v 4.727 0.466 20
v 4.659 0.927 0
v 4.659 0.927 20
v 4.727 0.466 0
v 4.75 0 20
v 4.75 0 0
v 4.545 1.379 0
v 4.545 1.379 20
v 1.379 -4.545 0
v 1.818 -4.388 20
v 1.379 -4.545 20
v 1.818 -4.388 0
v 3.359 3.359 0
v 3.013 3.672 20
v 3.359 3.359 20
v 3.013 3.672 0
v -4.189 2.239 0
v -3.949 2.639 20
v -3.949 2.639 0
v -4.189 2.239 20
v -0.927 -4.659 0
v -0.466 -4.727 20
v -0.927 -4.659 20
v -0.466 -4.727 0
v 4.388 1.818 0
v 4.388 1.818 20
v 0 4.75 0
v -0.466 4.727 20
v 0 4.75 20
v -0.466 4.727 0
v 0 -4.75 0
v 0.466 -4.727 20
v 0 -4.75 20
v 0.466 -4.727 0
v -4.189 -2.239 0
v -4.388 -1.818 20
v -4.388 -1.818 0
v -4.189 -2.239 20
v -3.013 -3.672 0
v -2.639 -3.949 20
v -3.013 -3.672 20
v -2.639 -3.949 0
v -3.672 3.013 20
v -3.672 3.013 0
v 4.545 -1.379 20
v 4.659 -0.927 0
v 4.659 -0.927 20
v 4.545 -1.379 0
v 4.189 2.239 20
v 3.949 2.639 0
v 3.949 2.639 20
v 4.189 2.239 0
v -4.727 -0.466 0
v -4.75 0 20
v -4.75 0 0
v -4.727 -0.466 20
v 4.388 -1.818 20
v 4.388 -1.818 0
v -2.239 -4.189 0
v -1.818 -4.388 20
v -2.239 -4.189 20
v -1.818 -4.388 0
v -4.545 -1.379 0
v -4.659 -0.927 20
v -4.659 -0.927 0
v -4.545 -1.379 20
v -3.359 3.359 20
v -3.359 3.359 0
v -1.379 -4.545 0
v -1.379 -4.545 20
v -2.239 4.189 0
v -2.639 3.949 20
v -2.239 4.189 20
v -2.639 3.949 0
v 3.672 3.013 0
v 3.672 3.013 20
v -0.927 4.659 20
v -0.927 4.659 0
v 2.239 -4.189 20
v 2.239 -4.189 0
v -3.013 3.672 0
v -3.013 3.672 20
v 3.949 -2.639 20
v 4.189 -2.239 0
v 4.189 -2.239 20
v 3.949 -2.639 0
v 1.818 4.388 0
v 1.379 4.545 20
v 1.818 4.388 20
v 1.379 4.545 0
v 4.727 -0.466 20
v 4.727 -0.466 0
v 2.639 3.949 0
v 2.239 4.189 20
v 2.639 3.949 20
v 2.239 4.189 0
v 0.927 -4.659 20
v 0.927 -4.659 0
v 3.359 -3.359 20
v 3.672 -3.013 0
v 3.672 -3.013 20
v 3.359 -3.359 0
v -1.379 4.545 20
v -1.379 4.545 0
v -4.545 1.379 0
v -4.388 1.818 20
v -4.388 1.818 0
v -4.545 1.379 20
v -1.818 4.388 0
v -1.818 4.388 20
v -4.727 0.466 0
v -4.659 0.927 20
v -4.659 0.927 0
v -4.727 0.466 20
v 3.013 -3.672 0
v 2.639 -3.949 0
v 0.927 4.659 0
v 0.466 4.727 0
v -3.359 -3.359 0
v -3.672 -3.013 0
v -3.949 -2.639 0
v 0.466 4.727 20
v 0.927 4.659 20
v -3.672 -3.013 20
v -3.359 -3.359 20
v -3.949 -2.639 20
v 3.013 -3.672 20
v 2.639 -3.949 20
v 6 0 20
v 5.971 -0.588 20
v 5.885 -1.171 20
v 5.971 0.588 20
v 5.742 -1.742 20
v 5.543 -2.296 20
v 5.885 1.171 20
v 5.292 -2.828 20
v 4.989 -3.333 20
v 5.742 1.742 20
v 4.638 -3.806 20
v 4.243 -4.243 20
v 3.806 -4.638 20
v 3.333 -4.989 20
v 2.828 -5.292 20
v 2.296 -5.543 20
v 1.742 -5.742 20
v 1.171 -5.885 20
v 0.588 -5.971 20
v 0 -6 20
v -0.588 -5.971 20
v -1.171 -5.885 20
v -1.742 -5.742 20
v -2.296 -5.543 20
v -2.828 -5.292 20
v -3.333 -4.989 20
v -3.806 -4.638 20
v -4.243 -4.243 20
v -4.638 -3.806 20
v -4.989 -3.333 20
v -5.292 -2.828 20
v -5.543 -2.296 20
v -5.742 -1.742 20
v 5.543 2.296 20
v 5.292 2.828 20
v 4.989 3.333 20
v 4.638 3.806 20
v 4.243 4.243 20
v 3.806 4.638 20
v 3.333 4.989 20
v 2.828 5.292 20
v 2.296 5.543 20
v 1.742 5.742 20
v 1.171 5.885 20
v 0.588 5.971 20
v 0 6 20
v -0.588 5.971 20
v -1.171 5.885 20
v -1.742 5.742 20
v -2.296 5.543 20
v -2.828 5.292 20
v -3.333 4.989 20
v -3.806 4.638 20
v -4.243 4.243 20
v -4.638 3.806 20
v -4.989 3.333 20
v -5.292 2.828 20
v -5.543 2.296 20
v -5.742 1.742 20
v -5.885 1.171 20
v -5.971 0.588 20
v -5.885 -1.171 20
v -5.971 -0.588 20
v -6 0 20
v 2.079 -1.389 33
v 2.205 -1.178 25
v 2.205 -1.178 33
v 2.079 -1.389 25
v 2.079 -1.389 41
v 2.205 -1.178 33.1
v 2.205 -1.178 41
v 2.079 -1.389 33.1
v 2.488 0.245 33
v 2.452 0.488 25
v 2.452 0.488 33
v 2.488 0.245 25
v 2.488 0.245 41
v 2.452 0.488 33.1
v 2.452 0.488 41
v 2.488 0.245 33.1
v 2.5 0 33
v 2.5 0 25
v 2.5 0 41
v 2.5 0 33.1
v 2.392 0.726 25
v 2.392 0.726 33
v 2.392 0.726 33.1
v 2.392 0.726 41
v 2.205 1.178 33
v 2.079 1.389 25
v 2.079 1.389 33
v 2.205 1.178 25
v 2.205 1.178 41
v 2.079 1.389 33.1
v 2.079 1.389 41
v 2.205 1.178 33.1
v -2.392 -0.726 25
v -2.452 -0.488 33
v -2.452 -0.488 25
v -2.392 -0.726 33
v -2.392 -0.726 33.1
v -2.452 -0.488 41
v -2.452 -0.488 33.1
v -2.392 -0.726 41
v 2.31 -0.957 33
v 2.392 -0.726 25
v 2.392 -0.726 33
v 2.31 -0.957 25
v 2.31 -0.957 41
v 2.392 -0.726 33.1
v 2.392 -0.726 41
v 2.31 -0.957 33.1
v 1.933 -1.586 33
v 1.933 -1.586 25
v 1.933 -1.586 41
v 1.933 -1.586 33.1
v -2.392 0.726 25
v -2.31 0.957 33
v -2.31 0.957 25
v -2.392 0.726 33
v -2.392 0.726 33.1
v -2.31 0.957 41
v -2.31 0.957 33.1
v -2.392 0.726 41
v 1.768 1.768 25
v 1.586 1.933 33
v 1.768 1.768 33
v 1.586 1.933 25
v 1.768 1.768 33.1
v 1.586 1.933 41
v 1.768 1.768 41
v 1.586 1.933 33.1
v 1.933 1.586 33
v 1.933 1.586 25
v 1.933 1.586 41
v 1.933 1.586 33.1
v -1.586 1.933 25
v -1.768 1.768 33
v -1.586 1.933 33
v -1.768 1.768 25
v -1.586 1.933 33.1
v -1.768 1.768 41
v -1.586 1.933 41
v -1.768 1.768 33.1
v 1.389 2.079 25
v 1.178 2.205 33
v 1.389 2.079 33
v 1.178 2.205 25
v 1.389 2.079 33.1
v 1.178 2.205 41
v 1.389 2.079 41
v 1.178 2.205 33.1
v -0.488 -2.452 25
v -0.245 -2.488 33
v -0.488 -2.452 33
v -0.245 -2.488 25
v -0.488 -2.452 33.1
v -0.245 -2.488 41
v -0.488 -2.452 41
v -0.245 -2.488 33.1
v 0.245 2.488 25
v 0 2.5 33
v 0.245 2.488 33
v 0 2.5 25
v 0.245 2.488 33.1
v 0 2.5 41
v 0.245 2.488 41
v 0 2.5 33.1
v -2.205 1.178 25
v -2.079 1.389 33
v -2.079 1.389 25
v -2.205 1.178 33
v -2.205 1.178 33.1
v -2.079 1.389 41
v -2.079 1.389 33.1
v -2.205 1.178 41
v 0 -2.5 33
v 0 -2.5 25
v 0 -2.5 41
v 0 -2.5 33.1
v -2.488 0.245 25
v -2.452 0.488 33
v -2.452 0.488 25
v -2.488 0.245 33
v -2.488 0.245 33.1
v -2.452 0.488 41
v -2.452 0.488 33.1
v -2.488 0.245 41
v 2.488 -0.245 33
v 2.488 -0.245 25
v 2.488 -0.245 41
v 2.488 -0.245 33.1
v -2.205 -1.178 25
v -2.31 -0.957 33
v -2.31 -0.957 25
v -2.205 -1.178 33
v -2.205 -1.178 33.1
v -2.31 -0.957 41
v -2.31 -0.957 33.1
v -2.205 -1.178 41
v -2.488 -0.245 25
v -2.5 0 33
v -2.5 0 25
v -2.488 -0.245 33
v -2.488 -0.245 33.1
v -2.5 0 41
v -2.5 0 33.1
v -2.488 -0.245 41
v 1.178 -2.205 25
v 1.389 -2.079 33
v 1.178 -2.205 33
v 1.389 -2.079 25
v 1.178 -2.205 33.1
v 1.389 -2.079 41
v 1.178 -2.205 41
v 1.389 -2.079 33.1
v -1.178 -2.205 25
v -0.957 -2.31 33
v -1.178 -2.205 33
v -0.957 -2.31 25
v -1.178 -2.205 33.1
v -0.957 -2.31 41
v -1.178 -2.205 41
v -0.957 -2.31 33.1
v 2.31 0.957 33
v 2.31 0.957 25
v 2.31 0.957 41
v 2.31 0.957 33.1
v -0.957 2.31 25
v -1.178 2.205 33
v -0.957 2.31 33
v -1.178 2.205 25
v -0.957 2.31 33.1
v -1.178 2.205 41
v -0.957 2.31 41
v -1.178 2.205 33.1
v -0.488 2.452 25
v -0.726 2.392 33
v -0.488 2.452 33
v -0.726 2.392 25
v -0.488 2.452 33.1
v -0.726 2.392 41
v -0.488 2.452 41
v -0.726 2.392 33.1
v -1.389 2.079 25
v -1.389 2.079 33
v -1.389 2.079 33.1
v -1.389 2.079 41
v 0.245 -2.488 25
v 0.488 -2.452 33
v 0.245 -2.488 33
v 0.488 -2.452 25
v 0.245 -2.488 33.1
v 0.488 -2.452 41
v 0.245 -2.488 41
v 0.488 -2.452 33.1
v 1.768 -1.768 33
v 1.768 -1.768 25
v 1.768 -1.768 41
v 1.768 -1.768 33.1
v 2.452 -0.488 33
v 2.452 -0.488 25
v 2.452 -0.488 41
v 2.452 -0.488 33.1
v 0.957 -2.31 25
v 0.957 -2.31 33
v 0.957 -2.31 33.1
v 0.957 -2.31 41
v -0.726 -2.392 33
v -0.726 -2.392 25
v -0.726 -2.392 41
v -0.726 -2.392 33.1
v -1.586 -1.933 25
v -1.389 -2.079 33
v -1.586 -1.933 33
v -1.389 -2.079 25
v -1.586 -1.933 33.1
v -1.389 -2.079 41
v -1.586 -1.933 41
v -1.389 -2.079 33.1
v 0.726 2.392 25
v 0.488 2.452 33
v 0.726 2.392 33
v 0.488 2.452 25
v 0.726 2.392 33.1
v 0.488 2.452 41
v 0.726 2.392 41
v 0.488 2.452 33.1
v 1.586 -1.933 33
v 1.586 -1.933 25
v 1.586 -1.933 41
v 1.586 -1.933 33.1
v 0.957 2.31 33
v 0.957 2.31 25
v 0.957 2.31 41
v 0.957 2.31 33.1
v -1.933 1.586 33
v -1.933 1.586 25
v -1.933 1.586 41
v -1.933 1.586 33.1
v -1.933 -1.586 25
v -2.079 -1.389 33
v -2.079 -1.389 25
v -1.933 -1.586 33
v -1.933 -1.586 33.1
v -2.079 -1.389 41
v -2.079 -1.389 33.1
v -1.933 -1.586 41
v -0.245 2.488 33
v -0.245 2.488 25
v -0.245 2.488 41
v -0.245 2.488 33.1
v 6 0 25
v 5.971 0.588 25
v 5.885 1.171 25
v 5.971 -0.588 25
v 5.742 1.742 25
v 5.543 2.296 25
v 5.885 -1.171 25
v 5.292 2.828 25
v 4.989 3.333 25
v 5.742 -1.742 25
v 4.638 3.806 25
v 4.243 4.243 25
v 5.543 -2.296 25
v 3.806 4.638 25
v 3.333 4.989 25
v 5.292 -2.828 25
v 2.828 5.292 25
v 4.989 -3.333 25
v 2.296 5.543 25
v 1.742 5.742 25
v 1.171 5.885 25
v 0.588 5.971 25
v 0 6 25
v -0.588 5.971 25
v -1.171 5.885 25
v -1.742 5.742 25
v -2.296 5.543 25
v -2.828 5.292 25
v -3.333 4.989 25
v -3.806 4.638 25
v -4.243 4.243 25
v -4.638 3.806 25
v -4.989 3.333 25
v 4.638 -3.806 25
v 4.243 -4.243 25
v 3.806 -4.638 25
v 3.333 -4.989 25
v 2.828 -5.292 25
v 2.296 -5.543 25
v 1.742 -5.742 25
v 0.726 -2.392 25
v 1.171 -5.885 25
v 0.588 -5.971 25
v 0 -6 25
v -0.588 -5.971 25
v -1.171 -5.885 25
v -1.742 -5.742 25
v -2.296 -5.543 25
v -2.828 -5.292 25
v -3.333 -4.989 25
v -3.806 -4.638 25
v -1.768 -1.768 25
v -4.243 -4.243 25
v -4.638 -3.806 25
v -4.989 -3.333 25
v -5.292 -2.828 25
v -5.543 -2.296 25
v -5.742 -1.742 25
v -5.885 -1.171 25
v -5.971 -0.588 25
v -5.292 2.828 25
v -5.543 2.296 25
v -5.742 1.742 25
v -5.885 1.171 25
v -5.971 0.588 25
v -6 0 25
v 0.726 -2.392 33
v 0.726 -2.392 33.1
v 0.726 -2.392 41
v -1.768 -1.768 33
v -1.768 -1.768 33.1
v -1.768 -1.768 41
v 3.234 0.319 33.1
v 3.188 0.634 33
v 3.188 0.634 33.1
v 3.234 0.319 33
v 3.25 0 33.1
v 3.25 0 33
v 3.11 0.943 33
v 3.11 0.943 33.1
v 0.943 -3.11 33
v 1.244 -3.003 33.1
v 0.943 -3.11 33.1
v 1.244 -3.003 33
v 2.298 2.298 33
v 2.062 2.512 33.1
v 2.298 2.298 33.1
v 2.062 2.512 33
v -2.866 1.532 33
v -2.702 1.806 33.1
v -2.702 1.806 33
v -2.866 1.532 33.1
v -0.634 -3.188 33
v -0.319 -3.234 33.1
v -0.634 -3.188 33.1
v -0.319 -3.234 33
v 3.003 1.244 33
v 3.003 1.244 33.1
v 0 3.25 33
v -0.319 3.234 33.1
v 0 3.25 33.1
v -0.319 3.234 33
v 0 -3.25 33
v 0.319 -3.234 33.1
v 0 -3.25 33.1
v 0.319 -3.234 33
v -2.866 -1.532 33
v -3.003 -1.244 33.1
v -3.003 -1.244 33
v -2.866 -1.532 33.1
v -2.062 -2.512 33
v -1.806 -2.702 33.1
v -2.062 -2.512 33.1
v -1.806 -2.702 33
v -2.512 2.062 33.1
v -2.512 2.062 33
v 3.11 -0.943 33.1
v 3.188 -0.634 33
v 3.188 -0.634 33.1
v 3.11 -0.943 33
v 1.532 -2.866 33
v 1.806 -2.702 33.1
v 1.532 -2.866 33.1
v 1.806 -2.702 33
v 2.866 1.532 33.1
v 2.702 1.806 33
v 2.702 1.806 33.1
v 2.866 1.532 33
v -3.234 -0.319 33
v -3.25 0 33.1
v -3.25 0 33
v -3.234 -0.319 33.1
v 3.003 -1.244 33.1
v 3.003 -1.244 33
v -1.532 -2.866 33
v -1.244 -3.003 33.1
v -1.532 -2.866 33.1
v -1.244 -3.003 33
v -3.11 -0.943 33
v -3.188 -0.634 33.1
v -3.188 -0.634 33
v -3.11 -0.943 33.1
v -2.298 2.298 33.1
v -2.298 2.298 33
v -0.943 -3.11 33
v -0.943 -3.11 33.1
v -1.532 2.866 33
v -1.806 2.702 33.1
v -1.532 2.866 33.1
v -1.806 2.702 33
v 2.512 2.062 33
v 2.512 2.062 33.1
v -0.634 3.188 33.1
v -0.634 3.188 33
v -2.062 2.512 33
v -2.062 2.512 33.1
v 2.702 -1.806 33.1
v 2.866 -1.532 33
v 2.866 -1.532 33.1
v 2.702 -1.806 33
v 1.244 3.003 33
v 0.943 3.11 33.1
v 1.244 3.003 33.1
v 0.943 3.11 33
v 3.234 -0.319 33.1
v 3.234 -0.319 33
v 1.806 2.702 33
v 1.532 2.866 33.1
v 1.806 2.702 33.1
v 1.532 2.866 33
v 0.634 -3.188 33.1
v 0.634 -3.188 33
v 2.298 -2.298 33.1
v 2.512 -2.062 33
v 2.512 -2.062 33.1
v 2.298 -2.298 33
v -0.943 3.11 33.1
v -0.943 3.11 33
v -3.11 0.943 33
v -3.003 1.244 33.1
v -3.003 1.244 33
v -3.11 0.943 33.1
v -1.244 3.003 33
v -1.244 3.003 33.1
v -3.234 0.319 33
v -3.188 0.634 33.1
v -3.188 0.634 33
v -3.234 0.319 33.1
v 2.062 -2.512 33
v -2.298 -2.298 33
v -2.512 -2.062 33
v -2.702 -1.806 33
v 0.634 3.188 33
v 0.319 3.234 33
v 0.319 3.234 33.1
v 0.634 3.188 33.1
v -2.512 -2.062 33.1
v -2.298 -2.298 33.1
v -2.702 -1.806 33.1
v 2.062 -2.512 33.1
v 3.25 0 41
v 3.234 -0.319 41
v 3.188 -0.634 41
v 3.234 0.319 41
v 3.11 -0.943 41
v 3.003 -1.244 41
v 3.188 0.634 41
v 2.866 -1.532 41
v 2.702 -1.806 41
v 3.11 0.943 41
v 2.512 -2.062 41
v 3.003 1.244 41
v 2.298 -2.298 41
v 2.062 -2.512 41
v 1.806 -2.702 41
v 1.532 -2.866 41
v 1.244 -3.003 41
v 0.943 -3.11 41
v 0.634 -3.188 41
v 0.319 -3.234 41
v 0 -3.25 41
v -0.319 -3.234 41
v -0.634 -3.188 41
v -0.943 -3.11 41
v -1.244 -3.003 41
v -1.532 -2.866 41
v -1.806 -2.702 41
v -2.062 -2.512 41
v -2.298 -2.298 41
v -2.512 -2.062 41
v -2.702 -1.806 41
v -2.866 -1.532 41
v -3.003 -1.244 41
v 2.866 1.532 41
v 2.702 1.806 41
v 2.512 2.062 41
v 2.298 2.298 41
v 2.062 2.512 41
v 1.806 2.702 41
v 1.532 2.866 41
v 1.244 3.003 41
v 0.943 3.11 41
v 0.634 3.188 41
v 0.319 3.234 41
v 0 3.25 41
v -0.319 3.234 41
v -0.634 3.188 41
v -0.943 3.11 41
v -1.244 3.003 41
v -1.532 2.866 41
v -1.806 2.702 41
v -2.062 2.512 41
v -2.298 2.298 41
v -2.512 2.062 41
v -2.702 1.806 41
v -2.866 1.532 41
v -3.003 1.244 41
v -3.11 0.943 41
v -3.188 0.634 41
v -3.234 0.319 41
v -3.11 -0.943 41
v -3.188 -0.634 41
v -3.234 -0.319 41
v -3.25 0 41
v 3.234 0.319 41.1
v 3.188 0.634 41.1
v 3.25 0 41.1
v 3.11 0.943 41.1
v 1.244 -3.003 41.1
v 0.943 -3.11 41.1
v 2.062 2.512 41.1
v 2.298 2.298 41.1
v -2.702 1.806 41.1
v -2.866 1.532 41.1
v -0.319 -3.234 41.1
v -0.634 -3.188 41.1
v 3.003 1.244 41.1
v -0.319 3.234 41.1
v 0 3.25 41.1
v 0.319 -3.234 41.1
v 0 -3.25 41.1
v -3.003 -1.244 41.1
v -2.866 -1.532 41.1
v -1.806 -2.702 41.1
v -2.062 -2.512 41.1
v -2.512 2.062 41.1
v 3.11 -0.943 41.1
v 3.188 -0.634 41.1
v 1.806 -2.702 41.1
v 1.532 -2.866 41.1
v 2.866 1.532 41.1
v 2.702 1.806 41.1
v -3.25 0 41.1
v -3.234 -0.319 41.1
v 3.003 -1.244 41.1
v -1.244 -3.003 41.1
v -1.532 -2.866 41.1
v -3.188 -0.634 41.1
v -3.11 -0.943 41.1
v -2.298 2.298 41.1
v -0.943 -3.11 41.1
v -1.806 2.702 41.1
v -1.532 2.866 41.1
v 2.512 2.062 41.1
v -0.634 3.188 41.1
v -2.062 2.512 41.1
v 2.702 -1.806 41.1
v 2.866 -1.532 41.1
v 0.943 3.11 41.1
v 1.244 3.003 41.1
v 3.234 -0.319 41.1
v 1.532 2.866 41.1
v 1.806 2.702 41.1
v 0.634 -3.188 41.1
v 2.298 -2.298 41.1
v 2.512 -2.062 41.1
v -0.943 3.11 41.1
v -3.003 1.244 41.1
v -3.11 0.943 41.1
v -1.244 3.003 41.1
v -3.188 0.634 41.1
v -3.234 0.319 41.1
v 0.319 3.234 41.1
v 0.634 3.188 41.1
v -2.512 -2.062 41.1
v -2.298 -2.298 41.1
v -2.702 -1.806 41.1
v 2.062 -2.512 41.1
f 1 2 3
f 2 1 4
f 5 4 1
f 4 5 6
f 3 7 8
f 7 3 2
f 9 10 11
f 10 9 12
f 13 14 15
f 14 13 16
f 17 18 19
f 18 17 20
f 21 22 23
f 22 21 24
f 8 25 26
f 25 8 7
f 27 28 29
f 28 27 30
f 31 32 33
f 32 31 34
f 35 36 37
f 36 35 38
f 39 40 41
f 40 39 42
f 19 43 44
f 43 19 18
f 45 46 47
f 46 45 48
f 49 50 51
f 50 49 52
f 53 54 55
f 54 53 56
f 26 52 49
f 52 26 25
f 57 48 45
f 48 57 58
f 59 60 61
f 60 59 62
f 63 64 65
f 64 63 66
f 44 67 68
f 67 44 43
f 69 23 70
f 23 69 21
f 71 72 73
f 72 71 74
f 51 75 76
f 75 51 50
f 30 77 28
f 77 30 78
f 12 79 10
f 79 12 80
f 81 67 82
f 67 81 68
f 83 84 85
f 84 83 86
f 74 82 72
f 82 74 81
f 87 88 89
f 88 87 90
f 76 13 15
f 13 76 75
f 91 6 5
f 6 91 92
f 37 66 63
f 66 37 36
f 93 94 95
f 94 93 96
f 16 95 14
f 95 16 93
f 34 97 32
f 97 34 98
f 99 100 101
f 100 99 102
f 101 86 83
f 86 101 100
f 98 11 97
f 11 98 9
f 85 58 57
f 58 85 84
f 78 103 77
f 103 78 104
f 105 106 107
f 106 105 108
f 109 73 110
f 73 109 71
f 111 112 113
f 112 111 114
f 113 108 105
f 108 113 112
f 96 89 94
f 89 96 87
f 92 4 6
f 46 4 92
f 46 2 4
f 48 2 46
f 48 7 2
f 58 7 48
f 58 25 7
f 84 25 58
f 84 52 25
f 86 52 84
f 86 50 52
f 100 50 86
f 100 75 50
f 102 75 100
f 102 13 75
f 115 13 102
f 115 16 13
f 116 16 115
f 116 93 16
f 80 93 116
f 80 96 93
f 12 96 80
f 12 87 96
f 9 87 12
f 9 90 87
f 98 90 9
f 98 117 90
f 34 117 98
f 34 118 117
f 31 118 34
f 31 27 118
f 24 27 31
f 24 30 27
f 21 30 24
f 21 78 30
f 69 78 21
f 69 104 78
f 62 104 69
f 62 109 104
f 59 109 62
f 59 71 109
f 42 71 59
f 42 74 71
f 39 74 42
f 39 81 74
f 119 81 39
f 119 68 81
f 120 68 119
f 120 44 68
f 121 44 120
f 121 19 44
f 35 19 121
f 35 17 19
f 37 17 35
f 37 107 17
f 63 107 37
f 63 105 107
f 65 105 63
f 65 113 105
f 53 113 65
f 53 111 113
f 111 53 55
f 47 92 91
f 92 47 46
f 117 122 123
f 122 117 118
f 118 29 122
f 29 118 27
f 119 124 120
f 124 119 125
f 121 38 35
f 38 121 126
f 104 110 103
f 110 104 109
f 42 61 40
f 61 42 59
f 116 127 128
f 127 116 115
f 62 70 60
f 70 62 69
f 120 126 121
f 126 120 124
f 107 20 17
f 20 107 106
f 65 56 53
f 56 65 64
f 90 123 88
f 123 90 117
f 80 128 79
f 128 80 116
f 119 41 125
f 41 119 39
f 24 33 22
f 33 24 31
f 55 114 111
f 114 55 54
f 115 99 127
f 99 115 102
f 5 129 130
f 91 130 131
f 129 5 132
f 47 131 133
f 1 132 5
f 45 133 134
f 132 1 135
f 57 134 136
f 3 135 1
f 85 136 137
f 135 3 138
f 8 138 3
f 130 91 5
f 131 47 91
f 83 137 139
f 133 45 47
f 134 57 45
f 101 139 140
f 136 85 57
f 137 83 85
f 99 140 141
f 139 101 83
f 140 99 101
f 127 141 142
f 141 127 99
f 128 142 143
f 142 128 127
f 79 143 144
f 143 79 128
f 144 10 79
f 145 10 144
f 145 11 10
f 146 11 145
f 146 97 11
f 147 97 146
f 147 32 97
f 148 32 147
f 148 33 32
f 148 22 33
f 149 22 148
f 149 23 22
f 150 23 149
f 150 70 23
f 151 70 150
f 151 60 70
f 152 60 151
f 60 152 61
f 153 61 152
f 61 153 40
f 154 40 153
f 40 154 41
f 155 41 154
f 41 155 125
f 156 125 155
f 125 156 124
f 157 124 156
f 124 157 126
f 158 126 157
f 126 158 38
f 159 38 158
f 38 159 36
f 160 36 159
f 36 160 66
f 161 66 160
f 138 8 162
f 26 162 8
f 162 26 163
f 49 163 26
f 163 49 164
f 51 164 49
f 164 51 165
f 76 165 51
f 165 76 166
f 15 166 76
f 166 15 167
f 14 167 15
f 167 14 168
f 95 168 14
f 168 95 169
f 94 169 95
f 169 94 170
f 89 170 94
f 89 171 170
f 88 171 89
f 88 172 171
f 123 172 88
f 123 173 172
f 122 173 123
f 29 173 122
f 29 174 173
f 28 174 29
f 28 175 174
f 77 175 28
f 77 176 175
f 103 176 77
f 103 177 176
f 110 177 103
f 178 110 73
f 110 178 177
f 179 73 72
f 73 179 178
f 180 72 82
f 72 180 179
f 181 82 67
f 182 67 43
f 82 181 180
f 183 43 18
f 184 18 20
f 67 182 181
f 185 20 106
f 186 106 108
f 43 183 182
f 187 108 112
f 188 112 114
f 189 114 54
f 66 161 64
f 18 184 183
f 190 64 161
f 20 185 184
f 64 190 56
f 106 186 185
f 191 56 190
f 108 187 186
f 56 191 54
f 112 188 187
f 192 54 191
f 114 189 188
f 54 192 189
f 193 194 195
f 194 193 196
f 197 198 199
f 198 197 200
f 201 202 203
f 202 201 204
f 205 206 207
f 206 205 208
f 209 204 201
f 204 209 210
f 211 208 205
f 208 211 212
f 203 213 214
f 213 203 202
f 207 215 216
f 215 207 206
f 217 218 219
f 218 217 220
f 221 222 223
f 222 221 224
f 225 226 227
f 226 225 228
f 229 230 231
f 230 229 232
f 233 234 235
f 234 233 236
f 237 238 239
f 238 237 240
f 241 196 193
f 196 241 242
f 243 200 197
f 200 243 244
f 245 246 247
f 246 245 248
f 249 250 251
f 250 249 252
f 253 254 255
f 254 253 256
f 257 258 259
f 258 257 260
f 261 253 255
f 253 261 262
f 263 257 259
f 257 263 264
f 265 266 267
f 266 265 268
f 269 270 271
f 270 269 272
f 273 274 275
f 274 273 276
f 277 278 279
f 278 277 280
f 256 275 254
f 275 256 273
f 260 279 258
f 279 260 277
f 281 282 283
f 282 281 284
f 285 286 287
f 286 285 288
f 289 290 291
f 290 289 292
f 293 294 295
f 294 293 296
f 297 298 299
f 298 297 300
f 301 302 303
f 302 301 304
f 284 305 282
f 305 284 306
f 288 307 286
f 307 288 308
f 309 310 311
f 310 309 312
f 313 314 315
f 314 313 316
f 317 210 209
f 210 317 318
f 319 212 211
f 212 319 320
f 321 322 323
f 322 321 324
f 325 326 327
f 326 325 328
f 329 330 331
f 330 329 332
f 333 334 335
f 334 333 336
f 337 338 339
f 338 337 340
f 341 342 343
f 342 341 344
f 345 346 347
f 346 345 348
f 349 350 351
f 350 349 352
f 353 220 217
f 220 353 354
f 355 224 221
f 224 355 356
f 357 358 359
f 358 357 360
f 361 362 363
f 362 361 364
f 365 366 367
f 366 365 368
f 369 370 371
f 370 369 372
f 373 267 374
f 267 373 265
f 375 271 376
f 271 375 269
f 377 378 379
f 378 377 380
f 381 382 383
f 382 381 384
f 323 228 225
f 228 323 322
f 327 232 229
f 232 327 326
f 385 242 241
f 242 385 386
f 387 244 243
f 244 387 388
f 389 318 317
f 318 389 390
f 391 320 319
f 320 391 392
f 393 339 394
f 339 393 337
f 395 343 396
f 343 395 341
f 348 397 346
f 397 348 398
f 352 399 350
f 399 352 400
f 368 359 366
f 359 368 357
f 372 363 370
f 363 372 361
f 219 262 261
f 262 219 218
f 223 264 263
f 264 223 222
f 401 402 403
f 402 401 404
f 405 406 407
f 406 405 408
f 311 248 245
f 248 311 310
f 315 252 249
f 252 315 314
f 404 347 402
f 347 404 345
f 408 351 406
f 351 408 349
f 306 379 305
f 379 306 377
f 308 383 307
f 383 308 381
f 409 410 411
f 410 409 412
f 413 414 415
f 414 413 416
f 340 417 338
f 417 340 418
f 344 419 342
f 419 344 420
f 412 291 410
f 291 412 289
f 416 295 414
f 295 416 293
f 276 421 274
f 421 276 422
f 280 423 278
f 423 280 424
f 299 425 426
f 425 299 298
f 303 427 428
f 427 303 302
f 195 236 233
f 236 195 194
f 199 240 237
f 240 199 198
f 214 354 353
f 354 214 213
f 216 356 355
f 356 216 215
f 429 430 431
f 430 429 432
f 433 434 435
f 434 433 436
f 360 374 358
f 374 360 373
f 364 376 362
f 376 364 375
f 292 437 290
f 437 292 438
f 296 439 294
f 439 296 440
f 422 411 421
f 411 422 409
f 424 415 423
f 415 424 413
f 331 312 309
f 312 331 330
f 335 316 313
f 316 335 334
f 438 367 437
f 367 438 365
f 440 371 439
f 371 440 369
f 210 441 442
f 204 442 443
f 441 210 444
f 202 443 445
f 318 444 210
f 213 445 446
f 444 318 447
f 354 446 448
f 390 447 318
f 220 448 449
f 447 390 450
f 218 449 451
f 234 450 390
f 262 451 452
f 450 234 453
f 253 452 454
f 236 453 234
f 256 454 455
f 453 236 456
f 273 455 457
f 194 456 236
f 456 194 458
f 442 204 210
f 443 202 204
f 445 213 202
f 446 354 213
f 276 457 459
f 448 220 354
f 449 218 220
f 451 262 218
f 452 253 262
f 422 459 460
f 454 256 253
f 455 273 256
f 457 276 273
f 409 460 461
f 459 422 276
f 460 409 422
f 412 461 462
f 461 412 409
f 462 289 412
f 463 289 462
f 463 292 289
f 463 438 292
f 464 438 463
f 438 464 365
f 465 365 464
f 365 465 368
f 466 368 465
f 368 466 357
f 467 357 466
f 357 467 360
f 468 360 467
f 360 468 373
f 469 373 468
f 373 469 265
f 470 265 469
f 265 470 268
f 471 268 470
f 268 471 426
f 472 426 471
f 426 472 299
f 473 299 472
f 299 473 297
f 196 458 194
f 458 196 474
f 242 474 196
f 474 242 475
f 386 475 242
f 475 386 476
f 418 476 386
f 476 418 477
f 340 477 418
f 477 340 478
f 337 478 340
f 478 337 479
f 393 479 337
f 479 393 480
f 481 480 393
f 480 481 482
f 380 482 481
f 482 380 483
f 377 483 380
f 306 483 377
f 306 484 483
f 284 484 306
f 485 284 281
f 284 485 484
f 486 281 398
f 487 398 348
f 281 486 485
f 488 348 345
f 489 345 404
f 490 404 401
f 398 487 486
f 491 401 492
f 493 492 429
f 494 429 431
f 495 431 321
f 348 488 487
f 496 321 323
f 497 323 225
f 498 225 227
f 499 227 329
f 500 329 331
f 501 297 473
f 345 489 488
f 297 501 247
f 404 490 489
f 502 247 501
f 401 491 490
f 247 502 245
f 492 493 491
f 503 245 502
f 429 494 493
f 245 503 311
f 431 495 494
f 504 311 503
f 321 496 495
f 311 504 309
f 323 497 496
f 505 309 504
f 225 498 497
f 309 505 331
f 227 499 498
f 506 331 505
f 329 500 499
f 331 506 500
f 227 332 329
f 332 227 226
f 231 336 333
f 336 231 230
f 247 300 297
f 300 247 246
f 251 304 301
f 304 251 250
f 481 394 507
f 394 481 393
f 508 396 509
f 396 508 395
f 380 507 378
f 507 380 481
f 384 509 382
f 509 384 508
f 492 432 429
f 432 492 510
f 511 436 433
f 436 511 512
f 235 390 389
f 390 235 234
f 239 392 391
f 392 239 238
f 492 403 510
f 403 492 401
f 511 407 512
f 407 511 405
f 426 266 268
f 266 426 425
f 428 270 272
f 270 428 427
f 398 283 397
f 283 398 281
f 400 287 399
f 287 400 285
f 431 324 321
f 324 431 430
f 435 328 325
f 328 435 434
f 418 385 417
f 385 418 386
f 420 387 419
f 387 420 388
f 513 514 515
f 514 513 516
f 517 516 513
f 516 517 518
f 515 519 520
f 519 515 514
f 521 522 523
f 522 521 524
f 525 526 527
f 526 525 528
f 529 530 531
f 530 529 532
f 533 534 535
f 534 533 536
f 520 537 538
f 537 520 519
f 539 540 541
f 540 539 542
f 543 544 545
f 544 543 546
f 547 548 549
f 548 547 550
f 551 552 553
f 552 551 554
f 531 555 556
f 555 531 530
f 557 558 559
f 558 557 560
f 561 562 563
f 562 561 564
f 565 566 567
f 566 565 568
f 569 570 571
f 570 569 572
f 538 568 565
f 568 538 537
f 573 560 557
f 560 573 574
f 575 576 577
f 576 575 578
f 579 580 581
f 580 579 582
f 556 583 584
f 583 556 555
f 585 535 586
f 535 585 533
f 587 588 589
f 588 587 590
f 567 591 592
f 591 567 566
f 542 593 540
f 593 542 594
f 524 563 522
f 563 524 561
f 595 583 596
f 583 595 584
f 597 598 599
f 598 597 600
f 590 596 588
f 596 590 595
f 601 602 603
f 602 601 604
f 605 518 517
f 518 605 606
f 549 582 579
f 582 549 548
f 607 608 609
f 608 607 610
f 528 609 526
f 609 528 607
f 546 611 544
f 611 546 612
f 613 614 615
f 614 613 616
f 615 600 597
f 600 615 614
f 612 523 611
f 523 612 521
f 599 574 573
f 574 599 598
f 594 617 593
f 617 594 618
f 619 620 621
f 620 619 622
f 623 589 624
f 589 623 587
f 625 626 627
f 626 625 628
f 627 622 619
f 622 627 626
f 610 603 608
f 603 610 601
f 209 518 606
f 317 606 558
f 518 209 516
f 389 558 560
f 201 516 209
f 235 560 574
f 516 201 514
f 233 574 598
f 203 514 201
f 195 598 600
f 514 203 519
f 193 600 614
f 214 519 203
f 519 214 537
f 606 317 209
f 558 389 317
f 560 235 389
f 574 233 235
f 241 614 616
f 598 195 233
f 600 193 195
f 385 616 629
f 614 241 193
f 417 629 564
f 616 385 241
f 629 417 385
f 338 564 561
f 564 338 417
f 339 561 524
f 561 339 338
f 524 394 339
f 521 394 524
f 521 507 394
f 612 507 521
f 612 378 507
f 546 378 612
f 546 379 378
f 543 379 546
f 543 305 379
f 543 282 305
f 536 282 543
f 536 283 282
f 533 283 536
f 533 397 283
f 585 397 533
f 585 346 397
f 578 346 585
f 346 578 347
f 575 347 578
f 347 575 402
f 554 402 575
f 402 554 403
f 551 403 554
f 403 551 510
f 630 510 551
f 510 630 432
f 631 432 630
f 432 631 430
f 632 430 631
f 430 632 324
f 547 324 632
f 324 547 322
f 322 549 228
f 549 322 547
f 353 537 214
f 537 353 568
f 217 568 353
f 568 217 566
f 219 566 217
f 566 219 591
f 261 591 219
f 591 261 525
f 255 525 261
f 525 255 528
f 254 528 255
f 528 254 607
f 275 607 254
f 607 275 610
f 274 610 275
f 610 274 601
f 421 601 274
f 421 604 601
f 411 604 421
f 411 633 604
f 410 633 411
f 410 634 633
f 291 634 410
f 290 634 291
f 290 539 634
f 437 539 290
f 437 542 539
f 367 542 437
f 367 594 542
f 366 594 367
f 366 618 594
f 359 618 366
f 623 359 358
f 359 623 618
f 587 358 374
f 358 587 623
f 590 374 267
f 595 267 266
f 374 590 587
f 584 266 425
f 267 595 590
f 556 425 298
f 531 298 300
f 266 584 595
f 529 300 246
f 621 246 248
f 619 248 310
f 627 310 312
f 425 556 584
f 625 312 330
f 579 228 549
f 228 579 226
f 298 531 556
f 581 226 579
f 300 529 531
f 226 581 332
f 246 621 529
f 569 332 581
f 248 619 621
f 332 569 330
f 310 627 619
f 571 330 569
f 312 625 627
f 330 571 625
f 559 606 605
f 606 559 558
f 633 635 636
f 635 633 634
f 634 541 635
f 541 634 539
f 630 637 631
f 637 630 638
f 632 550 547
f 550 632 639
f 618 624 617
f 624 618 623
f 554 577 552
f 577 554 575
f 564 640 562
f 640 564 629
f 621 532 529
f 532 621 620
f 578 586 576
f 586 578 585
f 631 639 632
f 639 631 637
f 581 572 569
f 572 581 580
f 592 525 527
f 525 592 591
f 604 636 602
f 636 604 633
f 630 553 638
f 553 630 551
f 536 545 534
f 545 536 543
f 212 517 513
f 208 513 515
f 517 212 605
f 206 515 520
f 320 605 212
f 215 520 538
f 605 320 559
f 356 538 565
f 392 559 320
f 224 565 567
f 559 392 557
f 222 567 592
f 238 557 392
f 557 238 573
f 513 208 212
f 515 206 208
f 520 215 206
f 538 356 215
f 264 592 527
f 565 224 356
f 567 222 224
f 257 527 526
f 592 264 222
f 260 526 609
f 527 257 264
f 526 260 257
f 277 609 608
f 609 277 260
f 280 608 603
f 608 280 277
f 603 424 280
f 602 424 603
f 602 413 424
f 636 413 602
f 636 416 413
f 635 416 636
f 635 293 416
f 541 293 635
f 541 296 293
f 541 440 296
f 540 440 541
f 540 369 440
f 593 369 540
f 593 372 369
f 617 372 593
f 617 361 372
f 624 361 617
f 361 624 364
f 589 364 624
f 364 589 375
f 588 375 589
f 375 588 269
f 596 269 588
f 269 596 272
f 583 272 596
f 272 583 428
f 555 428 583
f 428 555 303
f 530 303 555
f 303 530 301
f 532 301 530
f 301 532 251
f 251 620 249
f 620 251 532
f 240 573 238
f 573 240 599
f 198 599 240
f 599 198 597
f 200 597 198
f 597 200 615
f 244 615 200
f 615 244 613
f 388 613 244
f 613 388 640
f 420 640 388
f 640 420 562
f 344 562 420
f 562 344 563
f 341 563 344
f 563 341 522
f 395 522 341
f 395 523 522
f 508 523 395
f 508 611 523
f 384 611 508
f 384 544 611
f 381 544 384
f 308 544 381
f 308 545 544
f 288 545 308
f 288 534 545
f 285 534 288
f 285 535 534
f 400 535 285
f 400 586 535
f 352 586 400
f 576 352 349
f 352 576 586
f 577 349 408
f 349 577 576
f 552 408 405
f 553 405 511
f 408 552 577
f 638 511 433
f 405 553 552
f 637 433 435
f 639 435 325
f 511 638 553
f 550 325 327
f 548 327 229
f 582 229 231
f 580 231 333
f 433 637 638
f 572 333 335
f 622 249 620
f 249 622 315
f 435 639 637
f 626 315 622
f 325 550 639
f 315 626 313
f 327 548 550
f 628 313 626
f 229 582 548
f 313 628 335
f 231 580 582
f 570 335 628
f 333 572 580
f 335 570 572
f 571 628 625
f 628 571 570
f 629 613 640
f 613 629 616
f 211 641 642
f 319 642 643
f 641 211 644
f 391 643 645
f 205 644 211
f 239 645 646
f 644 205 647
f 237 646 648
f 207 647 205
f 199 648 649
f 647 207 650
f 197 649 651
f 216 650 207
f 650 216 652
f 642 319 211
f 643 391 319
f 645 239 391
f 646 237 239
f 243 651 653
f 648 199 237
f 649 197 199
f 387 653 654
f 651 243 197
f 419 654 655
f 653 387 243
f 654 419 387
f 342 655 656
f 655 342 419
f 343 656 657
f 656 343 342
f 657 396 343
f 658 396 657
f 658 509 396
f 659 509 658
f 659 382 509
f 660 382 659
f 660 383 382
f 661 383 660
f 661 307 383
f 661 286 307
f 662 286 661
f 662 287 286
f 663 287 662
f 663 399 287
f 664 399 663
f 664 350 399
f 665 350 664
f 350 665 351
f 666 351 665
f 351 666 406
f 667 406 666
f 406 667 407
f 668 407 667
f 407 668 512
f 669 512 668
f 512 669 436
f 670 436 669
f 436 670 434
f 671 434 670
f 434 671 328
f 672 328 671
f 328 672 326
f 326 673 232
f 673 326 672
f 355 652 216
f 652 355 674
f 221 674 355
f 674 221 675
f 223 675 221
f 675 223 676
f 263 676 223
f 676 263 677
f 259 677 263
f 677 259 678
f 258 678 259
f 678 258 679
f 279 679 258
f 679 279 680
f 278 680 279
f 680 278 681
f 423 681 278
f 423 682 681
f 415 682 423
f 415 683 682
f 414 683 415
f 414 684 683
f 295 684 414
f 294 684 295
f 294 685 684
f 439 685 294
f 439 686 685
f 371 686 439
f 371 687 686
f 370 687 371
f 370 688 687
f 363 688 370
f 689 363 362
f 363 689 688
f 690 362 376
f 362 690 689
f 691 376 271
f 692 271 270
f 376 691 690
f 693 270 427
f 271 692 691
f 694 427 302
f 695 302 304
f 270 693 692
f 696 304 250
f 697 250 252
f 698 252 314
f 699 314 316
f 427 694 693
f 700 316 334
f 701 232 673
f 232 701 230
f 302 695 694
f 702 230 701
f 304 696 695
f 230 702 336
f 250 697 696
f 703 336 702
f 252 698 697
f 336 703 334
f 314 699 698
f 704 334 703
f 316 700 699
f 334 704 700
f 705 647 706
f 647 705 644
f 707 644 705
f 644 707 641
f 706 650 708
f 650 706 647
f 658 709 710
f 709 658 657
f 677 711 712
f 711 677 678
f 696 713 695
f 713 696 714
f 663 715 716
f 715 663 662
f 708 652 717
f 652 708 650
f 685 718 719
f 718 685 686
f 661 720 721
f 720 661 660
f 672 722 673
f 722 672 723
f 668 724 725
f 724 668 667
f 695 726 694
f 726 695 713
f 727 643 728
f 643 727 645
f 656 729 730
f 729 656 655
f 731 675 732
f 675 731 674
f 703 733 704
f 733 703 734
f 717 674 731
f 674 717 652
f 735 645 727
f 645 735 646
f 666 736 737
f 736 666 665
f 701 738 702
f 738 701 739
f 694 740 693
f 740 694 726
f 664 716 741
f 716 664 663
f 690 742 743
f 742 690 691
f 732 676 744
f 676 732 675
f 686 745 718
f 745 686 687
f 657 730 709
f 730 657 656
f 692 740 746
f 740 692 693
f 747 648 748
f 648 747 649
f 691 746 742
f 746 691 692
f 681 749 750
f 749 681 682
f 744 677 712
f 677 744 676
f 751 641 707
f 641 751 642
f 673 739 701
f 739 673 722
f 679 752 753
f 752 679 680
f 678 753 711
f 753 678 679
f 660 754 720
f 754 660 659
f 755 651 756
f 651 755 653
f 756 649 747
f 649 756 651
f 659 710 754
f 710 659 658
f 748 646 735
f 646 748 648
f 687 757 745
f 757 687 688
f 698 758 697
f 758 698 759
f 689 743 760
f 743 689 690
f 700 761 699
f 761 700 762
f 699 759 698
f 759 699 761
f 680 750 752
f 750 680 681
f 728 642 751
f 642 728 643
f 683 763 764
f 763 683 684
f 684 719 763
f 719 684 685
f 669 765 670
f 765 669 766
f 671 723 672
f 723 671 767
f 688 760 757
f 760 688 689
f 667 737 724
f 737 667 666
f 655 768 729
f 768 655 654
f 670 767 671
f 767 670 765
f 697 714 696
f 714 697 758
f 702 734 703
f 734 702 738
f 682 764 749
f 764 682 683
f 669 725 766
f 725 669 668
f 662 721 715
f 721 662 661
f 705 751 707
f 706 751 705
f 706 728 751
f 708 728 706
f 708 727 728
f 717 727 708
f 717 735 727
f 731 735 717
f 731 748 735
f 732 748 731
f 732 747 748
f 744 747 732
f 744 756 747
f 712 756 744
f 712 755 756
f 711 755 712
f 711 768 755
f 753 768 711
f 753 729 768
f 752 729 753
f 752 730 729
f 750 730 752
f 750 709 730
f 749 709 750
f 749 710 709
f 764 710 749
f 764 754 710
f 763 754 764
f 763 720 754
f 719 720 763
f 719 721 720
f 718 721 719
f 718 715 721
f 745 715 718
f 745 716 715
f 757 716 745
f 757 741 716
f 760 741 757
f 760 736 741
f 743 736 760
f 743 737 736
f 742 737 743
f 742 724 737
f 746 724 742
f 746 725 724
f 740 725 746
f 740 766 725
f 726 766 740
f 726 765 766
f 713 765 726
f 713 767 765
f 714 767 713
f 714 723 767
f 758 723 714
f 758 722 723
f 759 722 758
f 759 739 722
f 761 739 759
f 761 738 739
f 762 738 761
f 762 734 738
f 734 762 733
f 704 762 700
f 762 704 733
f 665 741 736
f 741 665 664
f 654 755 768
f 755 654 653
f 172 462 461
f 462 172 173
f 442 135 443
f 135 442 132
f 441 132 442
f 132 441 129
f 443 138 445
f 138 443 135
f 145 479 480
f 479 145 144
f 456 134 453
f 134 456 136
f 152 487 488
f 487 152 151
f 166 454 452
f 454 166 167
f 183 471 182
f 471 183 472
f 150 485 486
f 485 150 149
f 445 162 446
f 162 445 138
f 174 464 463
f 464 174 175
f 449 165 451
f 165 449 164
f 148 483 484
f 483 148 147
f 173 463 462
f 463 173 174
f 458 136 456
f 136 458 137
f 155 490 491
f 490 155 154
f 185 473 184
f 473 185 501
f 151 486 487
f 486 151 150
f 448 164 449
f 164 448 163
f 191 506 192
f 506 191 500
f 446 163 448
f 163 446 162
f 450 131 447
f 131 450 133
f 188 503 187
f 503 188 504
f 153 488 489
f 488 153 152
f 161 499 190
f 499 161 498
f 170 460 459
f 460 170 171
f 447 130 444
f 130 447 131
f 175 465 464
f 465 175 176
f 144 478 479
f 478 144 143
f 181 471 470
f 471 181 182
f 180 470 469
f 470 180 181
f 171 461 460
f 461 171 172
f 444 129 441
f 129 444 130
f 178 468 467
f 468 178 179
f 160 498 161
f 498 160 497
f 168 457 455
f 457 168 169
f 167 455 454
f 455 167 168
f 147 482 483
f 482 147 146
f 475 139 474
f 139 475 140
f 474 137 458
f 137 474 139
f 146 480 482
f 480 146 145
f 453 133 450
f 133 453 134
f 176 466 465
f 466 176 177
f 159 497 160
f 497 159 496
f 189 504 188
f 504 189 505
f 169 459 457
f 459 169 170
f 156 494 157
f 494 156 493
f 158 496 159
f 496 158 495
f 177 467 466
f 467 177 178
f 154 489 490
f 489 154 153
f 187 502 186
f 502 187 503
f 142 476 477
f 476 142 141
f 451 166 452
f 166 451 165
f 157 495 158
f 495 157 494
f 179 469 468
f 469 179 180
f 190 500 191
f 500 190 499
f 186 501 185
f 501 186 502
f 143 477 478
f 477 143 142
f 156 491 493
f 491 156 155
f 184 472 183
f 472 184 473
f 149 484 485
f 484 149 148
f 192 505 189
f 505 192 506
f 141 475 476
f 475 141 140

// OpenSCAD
// Hose-barb reducer
// 8mm ID to 5mm ID
// Print upright along Z axis

// Dimensions
barb_height_8mm = 10; // height of barbs for 8mm tubing
barb_top_diameter_8mm = 9.5; // top diameter of 8mm barbs
barb_bottom_diameter_8mm = 7.5; // bottom diameter of 8mm barbs
barb_step_diameter_8mm = 7.5; // step back diameter of 8mm barbs

barb_height_5mm = 8; // height of barbs for 5mm tubing
barb_top_diameter_5mm = 5.0; // top diameter of 5mm barbs
barb_bottom_diameter_5mm = 6.5; // bottom diameter of 5mm barbs
barb_step_diameter_5mm = 6.5; // step back diameter of 5mm barbs

collar_diameter = 12; // diameter of collar
collar_height = 5; // height of collar

inner_diameter = 3; // bore diameter

// Main body
union() {
  // 8mm barbs
  for (i = [0, 1]) {
    translate([0, 0, i * barb_height_8mm])
    cylinder(h = barb_height_8mm, r = barb_top_diameter_8mm / 2, $fn = 64);
    
    translate([0, 0, i * barb_height_8mm + barb_height_8mm])
    cylinder(h = 0.1, r = barb_step_diameter_8mm / 2, $fn = 64);
  }
  
  // Collar
  translate([0, 0, 20])
  cylinder(h = collar_height, r = collar_diameter / 2, $fn = 64);
  
  // 5mm barbs
  for (i = [0, 1]) {
    translate([0, 0, 25 + i * barb_height_5mm])
    cylinder(h = barb_height_5mm, r = barb_top_diameter_5mm / 2, $fn = 64);
    
    translate([0, 0, 25 + i * barb_height_5mm + barb_height_5mm])
    cylinder(h = 0.1, r = barb_step_diameter_5mm / 2, $fn = 64);
  }
  
  // Central bore
  cylinder(h = 41, r = inner_diameter / 2, $fn = 64);
}
